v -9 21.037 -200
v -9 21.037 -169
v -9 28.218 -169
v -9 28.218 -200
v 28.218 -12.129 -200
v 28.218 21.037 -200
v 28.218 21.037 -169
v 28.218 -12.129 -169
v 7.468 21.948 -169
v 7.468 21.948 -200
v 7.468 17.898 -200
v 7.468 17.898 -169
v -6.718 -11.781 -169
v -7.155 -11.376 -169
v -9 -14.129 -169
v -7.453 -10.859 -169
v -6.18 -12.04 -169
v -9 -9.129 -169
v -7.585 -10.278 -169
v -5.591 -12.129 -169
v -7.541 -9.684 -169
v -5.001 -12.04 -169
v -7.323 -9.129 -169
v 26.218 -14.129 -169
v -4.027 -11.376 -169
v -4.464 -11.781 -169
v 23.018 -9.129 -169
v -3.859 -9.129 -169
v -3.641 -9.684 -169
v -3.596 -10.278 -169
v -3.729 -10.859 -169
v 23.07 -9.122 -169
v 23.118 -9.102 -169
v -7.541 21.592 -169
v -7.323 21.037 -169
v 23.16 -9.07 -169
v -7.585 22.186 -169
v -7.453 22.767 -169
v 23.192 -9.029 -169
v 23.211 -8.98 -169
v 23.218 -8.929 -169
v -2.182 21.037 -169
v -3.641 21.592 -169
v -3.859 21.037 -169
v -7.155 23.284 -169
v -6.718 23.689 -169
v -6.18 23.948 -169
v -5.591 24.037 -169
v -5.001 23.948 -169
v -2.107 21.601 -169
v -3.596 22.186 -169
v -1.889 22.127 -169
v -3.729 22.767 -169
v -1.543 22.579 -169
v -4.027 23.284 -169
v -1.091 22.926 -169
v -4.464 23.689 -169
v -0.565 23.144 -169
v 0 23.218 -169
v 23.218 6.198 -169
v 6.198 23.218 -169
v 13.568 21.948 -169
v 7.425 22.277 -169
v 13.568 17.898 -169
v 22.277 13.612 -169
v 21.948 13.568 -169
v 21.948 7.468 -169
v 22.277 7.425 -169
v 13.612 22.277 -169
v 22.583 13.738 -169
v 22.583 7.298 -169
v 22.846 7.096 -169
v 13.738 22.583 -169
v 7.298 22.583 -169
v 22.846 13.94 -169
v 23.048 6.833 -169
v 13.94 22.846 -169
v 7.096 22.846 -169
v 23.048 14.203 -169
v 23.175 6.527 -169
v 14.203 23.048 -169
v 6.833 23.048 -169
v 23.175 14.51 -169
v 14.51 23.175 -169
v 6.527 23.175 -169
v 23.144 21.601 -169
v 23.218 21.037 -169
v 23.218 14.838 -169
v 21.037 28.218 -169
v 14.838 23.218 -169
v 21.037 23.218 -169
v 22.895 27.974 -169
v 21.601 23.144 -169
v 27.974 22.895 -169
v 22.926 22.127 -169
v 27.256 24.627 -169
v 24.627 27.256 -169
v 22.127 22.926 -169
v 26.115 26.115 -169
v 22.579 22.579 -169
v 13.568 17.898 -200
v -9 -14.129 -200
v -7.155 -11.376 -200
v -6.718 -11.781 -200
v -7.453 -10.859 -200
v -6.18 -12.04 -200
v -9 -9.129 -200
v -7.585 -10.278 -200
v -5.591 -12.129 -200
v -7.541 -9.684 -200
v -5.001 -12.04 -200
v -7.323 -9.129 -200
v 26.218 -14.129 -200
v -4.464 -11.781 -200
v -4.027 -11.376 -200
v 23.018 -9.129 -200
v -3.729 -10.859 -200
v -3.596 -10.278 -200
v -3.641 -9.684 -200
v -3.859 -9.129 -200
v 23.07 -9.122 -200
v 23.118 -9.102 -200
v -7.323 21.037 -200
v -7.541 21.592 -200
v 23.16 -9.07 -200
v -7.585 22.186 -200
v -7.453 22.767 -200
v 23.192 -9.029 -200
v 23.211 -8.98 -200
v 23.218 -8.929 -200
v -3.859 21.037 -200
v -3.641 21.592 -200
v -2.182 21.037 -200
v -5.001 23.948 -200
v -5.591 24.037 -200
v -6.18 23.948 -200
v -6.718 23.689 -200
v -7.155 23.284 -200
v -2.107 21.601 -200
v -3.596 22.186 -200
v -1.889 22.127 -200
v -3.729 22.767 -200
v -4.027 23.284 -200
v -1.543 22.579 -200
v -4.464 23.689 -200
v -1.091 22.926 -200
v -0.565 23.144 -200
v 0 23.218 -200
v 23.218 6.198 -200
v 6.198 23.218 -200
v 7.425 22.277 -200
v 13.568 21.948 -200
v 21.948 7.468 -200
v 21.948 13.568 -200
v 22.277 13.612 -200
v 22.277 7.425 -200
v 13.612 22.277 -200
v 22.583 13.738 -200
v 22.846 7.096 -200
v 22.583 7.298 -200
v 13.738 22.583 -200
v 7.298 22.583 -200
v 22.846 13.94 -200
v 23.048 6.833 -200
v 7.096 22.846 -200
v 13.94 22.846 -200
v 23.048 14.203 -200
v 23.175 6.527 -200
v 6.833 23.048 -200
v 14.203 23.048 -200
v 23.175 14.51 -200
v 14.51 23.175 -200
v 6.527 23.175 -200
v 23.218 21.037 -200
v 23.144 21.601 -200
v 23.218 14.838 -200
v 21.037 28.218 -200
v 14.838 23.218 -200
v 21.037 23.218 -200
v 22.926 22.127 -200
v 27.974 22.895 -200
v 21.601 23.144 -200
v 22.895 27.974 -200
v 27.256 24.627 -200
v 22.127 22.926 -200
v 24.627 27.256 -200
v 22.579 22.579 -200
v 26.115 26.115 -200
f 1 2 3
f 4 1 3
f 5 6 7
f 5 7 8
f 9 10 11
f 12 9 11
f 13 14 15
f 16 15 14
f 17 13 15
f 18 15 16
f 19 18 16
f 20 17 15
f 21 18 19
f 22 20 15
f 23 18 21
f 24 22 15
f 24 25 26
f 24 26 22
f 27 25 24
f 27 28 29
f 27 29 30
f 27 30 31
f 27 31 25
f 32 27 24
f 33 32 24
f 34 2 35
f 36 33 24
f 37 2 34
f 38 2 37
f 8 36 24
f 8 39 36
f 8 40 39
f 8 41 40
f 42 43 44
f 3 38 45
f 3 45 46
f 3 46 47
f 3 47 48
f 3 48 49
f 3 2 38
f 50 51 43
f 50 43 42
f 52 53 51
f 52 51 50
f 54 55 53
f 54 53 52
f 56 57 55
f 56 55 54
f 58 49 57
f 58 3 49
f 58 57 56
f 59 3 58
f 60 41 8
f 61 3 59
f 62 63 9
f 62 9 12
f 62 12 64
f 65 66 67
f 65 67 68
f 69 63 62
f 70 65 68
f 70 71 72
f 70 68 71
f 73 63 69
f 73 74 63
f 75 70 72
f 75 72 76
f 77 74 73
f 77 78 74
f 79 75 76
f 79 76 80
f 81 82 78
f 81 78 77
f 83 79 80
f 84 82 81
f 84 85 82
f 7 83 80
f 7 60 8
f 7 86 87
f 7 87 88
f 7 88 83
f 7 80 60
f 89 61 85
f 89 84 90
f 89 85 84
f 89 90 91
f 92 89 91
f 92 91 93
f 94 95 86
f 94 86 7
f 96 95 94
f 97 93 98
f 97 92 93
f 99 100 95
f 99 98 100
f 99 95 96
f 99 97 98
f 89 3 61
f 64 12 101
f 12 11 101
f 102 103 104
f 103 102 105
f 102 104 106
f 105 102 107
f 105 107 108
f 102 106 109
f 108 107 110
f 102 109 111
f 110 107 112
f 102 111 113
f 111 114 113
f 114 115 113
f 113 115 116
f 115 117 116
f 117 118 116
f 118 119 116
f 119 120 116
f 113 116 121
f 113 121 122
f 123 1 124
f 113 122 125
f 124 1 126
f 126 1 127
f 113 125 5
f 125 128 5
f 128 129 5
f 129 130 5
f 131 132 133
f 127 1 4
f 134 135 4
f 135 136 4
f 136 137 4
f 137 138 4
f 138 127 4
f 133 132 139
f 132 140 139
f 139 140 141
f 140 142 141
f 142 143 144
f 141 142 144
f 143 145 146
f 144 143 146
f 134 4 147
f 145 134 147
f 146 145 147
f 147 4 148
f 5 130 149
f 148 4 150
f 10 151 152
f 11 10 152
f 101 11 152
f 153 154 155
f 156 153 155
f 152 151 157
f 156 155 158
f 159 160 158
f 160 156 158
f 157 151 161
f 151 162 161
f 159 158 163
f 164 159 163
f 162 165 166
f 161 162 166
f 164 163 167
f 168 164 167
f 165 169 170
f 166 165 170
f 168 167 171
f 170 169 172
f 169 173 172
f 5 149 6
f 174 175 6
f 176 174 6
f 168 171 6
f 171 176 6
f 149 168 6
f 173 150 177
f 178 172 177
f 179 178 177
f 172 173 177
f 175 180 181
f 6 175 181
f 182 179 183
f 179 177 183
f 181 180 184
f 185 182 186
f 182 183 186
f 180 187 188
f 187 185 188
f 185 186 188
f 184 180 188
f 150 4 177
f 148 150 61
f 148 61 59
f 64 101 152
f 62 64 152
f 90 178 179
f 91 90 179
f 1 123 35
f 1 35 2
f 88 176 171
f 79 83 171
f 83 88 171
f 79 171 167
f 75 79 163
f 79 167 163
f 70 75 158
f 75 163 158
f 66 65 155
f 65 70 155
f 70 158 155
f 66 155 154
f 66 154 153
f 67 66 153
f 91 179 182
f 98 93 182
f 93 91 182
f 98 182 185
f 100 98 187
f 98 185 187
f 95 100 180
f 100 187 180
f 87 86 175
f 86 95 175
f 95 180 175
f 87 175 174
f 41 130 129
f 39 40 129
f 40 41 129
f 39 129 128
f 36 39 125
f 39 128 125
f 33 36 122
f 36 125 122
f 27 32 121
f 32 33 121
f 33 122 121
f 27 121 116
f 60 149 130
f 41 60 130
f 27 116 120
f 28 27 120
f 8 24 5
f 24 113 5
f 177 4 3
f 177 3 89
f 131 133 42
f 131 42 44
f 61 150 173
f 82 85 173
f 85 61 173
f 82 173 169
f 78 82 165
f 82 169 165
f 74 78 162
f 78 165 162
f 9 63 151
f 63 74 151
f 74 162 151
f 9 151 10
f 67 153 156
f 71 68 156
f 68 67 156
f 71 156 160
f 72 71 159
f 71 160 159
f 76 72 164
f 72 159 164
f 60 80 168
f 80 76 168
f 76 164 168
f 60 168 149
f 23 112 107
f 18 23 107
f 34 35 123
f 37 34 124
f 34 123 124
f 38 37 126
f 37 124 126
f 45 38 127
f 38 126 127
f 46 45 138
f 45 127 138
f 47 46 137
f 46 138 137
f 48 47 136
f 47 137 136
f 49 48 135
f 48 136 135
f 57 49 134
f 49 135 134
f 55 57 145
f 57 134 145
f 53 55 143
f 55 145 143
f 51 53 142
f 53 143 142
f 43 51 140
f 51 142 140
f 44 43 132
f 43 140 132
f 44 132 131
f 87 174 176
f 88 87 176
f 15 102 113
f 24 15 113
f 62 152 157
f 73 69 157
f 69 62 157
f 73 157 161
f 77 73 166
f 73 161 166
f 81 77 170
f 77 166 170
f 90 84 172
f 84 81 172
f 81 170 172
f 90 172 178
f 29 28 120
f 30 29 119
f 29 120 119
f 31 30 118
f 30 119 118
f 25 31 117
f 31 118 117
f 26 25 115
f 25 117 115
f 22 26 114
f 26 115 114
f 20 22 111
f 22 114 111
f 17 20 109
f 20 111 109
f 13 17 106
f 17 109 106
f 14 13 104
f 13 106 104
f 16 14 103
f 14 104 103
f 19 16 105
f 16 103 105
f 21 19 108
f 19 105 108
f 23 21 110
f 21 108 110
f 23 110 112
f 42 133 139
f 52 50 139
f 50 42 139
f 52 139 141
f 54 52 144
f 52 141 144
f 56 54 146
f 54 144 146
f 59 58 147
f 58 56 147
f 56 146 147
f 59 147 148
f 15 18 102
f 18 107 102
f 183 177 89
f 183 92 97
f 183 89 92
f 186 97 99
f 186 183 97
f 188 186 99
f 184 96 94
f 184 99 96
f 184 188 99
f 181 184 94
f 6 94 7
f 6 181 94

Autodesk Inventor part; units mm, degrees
ref_plane "YZ Plane" through (0, 0, 0) normal (1, 0, 0) x (0, 1, 0)
ref_plane "XZ Plane" through (0, 0, 0) normal (0, 1, 0) x (-1, 0, 0)
ref_plane "XY Plane" through (0, 0, 0) normal (0, 0, 1) x (1, 0, 0)
ref_plane "Work Plane2" through (0, 0, -200) normal (0, 0, 1) x (1, 0, 0)
ref_plane "Work Plane1" through (0, 0, 0) normal (0, 0, 1) x (1, 0, 0)
sketch "Sketch1" plane through (0, 0, -200) normal (0, 0, 1) x (1, 0, 0)
  arc A0 (6.1983, 20.8783) -> (6.1983, 23.0183) centre (6.1983, 21.9483) ccw construction
  line L0 (12.2867, 14.8983) -> (8.7499, 14.8983) construction
  arc A1 (14.8383, 23.0183) -> (14.8383, 20.8783) centre (14.8383, 21.9483) ccw construction
  arc A2 (23.0183, 21.0366) -> (21.0366, 23.0183) centre (21.0366, 21.0366) ccw construction
  line L1 (21.0366, 23.0183) -> (14.8383, 23.0183) construction
  arc A3 (20.8783, 14.8383) -> (23.0183, 14.8383) centre (21.9483, 14.8383) ccw construction
  line L2 (23.0183, 14.8383) -> (23.0183, 21.0366) construction
  line L3 (14.8983, 8.7499) -> (14.8983, 12.2867) construction
  line L4 (-1.9817, 21.0366) -> (-1.9817, 0) construction
  arc A4 (-1.9817, 0) -> (0, -1.9817) centre (0, 0) ccw construction
  line L5 (0, -1.9817) -> (6.1983, -1.9817) construction
  line L6 (14.8383, -1.9817) -> (21.0366, -1.9817) construction
  arc A5 (21.0366, -1.9817) -> (23.0183, 0) centre (21.0366, 0) ccw construction
  line L7 (23.0183, 0) -> (23.0183, 6.1983) construction
  arc A6 (23.0183, 6.1983) -> (20.8783, 6.1983) centre (21.9483, 6.1983) ccw construction
  line L8 (20.8783, 6.1983) -> (20.8783, 4.0901) construction
  arc A7 (19.1681, 3.3817) -> (20.8783, 4.0901) centre (19.8765, 4.0901) ccw construction
  line L9 (19.1681, 3.3817) -> (15.675, 6.8748) construction
  arc A8 (14.8983, 8.7499) -> (15.675, 6.8748) centre (17.55, 8.7499) ccw construction
  line L10 (15.675, 14.1617) -> (19.1681, 17.6549) construction
  arc A9 (15.675, 14.1617) -> (14.8983, 12.2867) centre (17.55, 12.2867) ccw construction
  line L11 (20.8783, 16.9465) -> (20.8783, 14.8383) construction
  arc A10 (20.8783, 16.9465) -> (19.1681, 17.6549) centre (19.8765, 16.9465) ccw construction
  line L12 (17.6549, 19.1681) -> (14.1617, 15.675) construction
  arc A11 (17.6549, 19.1681) -> (16.9465, 20.8783) centre (16.9465, 19.8765) ccw construction
  line L13 (14.8383, 20.8783) -> (16.9465, 20.8783) construction
  arc A12 (12.2867, 14.8983) -> (14.1617, 15.675) centre (12.2867, 17.55) ccw construction
  arc A13 (6.8748, 15.675) -> (8.7499, 14.8983) centre (8.7499, 17.55) ccw construction
  line L14 (6.8748, 15.675) -> (3.3817, 19.1681) construction
  arc A14 (4.0901, 20.8783) -> (3.3817, 19.1681) centre (4.0901, 19.8765) ccw construction
  line L15 (4.0901, 20.8783) -> (6.1983, 20.8783) construction
  line L16 (6.1983, 23.0183) -> (0, 23.0183) construction
  arc A15 (0, 23.0183) -> (-1.9817, 21.0366) centre (0, 21.0366) ccw construction
  line L17 (7.4683, 21.9483) -> (7.4683, 17.8983)
  line L18 (7.4683, 17.8983) -> (13.5683, 17.8983)
  line L19 (13.5683, 17.8983) -> (13.5683, 21.9483)
  arc A16 (7.4683, 21.9483) -> (6.1983, 23.2183) centre (6.1983, 21.9483) ccw
  arc A17 (14.8383, 23.2183) -> (13.5683, 21.9483) centre (14.8383, 21.9483) ccw
  line L20 (6.1983, 23.2183) -> (0, 23.2183)
  line L21 (0, 23.2183) -> (0, 28.2183)
  line L22 (0, 28.2183) -> (21.0366, 28.2183)
  arc A18 (23.2183, 21.0366) -> (21.0366, 23.2183) centre (21.0366, 21.0366) ccw
  line L23 (23.2183, 21.0366) -> (23.2183, 14.8383)
  arc A19 (21.9483, 13.5683) -> (23.2183, 14.8383) centre (21.9483, 14.8383) ccw
  arc A20 (28.2183, 21.0366) -> (21.0366, 28.2183) centre (21.0366, 21.0366) ccw
  line L24 (28.2183, 21.0366) -> (28.2183, 0)
  line L25 (21.9483, 13.5683) -> (21.9483, 7.4683)
  arc A21 (23.2183, 6.1983) -> (21.9483, 7.4683) centre (21.9483, 6.1983) ccw
  line L26 (23.2183, 6.1983) -> (23.2183, -8.9287)
  line L27 (23.0183, -9.1287) -> (-9, -9.1287)
  line L28 (-9, -9.1287) -> (-9, -14.1287)
  line L29 (-9, -14.1287) -> (26.2183, -14.1287)
  line L30 (28.2183, -12.1287) -> (28.2183, 0)
  arc A22 (23.0183, -9.1287) -> (23.2183, -8.9287) centre (23.0183, -8.9287) ccw
  line L31 (14.8383, 23.2183) -> (21.0366, 23.2183)
  line L32 (0, 28.2183) -> (-9, 28.2183)
  arc A23 (0, 23.2183) -> (-2.1817, 21.0366) centre (0, 21.0366) ccw
  line L33 (-2.1817, 21.0366) -> (-9, 21.0366)
  line L34 (-9, 21.0366) -> (-9, 28.2183)
  circle A24 centre (-5.5909, 22.0366) radius 2
  line L35 (-5.5909, 21.0366) -> (-5.5909, 28.2183) construction
  line L36 (-5.5909, 21.0366) -> (-5.5909, -14.1287) construction
  circle A25 centre (-5.5909, -10.1287) radius 2
  line L37 (26.2183, -14.1287) -> (28.2183, -12.1287)
  point P0 (0, 0)
  point P1 (7.2683, 21.9483)
  point P2 (10.5183, 14.8983)
  point P3 (10.5183, 17.8983)
  point P4 (13.7683, 21.9483)
  point P5 (23.0183, -8.9287)
  point P6 (-1.9817, -8.9287)
  point P7 (28.2183, -14.1287)
  point P8 (17.4722, 23.2183)
  point P9 (-9, 24.6274)
  point P10 (-3.8588, -9.1287)
  point P11 (-7.3229, -9.1287)
  point P12 (-7.3229, 21.0366)
  point P13 (-3.8588, 21.0366)
  dimension "d1" = 0.2
  dimension "d2" = 3
  dimension "d3" = 0.2
  dimension "d4" = 0.2
  dimension "d5" = 0.2
  dimension "d6" = 5
  dimension "d7" = 5
  dimension "d8" = 5
  dimension "d9" = 0.2
  dimension "d13" = 9
  dimension "d14" = 4
  dimension "d15" = 1
  dimension "d16" = 4
  dimension "d17" = 1
  dimension "d18" = 135
  dimension "d19" = 2
extrude "Extrusion1" add sketch "Sketch1" along normal blind 31 contours A16 L20 L21 L22 A20 L24 L30 L37 L29 L28 L27 A25 A22 L26 A21 L25 A19 L23 A18 L31 A17 L19 L18 L17 | A23 L33 A24 L34 L32 L21
properties part number "HangerNinety"
